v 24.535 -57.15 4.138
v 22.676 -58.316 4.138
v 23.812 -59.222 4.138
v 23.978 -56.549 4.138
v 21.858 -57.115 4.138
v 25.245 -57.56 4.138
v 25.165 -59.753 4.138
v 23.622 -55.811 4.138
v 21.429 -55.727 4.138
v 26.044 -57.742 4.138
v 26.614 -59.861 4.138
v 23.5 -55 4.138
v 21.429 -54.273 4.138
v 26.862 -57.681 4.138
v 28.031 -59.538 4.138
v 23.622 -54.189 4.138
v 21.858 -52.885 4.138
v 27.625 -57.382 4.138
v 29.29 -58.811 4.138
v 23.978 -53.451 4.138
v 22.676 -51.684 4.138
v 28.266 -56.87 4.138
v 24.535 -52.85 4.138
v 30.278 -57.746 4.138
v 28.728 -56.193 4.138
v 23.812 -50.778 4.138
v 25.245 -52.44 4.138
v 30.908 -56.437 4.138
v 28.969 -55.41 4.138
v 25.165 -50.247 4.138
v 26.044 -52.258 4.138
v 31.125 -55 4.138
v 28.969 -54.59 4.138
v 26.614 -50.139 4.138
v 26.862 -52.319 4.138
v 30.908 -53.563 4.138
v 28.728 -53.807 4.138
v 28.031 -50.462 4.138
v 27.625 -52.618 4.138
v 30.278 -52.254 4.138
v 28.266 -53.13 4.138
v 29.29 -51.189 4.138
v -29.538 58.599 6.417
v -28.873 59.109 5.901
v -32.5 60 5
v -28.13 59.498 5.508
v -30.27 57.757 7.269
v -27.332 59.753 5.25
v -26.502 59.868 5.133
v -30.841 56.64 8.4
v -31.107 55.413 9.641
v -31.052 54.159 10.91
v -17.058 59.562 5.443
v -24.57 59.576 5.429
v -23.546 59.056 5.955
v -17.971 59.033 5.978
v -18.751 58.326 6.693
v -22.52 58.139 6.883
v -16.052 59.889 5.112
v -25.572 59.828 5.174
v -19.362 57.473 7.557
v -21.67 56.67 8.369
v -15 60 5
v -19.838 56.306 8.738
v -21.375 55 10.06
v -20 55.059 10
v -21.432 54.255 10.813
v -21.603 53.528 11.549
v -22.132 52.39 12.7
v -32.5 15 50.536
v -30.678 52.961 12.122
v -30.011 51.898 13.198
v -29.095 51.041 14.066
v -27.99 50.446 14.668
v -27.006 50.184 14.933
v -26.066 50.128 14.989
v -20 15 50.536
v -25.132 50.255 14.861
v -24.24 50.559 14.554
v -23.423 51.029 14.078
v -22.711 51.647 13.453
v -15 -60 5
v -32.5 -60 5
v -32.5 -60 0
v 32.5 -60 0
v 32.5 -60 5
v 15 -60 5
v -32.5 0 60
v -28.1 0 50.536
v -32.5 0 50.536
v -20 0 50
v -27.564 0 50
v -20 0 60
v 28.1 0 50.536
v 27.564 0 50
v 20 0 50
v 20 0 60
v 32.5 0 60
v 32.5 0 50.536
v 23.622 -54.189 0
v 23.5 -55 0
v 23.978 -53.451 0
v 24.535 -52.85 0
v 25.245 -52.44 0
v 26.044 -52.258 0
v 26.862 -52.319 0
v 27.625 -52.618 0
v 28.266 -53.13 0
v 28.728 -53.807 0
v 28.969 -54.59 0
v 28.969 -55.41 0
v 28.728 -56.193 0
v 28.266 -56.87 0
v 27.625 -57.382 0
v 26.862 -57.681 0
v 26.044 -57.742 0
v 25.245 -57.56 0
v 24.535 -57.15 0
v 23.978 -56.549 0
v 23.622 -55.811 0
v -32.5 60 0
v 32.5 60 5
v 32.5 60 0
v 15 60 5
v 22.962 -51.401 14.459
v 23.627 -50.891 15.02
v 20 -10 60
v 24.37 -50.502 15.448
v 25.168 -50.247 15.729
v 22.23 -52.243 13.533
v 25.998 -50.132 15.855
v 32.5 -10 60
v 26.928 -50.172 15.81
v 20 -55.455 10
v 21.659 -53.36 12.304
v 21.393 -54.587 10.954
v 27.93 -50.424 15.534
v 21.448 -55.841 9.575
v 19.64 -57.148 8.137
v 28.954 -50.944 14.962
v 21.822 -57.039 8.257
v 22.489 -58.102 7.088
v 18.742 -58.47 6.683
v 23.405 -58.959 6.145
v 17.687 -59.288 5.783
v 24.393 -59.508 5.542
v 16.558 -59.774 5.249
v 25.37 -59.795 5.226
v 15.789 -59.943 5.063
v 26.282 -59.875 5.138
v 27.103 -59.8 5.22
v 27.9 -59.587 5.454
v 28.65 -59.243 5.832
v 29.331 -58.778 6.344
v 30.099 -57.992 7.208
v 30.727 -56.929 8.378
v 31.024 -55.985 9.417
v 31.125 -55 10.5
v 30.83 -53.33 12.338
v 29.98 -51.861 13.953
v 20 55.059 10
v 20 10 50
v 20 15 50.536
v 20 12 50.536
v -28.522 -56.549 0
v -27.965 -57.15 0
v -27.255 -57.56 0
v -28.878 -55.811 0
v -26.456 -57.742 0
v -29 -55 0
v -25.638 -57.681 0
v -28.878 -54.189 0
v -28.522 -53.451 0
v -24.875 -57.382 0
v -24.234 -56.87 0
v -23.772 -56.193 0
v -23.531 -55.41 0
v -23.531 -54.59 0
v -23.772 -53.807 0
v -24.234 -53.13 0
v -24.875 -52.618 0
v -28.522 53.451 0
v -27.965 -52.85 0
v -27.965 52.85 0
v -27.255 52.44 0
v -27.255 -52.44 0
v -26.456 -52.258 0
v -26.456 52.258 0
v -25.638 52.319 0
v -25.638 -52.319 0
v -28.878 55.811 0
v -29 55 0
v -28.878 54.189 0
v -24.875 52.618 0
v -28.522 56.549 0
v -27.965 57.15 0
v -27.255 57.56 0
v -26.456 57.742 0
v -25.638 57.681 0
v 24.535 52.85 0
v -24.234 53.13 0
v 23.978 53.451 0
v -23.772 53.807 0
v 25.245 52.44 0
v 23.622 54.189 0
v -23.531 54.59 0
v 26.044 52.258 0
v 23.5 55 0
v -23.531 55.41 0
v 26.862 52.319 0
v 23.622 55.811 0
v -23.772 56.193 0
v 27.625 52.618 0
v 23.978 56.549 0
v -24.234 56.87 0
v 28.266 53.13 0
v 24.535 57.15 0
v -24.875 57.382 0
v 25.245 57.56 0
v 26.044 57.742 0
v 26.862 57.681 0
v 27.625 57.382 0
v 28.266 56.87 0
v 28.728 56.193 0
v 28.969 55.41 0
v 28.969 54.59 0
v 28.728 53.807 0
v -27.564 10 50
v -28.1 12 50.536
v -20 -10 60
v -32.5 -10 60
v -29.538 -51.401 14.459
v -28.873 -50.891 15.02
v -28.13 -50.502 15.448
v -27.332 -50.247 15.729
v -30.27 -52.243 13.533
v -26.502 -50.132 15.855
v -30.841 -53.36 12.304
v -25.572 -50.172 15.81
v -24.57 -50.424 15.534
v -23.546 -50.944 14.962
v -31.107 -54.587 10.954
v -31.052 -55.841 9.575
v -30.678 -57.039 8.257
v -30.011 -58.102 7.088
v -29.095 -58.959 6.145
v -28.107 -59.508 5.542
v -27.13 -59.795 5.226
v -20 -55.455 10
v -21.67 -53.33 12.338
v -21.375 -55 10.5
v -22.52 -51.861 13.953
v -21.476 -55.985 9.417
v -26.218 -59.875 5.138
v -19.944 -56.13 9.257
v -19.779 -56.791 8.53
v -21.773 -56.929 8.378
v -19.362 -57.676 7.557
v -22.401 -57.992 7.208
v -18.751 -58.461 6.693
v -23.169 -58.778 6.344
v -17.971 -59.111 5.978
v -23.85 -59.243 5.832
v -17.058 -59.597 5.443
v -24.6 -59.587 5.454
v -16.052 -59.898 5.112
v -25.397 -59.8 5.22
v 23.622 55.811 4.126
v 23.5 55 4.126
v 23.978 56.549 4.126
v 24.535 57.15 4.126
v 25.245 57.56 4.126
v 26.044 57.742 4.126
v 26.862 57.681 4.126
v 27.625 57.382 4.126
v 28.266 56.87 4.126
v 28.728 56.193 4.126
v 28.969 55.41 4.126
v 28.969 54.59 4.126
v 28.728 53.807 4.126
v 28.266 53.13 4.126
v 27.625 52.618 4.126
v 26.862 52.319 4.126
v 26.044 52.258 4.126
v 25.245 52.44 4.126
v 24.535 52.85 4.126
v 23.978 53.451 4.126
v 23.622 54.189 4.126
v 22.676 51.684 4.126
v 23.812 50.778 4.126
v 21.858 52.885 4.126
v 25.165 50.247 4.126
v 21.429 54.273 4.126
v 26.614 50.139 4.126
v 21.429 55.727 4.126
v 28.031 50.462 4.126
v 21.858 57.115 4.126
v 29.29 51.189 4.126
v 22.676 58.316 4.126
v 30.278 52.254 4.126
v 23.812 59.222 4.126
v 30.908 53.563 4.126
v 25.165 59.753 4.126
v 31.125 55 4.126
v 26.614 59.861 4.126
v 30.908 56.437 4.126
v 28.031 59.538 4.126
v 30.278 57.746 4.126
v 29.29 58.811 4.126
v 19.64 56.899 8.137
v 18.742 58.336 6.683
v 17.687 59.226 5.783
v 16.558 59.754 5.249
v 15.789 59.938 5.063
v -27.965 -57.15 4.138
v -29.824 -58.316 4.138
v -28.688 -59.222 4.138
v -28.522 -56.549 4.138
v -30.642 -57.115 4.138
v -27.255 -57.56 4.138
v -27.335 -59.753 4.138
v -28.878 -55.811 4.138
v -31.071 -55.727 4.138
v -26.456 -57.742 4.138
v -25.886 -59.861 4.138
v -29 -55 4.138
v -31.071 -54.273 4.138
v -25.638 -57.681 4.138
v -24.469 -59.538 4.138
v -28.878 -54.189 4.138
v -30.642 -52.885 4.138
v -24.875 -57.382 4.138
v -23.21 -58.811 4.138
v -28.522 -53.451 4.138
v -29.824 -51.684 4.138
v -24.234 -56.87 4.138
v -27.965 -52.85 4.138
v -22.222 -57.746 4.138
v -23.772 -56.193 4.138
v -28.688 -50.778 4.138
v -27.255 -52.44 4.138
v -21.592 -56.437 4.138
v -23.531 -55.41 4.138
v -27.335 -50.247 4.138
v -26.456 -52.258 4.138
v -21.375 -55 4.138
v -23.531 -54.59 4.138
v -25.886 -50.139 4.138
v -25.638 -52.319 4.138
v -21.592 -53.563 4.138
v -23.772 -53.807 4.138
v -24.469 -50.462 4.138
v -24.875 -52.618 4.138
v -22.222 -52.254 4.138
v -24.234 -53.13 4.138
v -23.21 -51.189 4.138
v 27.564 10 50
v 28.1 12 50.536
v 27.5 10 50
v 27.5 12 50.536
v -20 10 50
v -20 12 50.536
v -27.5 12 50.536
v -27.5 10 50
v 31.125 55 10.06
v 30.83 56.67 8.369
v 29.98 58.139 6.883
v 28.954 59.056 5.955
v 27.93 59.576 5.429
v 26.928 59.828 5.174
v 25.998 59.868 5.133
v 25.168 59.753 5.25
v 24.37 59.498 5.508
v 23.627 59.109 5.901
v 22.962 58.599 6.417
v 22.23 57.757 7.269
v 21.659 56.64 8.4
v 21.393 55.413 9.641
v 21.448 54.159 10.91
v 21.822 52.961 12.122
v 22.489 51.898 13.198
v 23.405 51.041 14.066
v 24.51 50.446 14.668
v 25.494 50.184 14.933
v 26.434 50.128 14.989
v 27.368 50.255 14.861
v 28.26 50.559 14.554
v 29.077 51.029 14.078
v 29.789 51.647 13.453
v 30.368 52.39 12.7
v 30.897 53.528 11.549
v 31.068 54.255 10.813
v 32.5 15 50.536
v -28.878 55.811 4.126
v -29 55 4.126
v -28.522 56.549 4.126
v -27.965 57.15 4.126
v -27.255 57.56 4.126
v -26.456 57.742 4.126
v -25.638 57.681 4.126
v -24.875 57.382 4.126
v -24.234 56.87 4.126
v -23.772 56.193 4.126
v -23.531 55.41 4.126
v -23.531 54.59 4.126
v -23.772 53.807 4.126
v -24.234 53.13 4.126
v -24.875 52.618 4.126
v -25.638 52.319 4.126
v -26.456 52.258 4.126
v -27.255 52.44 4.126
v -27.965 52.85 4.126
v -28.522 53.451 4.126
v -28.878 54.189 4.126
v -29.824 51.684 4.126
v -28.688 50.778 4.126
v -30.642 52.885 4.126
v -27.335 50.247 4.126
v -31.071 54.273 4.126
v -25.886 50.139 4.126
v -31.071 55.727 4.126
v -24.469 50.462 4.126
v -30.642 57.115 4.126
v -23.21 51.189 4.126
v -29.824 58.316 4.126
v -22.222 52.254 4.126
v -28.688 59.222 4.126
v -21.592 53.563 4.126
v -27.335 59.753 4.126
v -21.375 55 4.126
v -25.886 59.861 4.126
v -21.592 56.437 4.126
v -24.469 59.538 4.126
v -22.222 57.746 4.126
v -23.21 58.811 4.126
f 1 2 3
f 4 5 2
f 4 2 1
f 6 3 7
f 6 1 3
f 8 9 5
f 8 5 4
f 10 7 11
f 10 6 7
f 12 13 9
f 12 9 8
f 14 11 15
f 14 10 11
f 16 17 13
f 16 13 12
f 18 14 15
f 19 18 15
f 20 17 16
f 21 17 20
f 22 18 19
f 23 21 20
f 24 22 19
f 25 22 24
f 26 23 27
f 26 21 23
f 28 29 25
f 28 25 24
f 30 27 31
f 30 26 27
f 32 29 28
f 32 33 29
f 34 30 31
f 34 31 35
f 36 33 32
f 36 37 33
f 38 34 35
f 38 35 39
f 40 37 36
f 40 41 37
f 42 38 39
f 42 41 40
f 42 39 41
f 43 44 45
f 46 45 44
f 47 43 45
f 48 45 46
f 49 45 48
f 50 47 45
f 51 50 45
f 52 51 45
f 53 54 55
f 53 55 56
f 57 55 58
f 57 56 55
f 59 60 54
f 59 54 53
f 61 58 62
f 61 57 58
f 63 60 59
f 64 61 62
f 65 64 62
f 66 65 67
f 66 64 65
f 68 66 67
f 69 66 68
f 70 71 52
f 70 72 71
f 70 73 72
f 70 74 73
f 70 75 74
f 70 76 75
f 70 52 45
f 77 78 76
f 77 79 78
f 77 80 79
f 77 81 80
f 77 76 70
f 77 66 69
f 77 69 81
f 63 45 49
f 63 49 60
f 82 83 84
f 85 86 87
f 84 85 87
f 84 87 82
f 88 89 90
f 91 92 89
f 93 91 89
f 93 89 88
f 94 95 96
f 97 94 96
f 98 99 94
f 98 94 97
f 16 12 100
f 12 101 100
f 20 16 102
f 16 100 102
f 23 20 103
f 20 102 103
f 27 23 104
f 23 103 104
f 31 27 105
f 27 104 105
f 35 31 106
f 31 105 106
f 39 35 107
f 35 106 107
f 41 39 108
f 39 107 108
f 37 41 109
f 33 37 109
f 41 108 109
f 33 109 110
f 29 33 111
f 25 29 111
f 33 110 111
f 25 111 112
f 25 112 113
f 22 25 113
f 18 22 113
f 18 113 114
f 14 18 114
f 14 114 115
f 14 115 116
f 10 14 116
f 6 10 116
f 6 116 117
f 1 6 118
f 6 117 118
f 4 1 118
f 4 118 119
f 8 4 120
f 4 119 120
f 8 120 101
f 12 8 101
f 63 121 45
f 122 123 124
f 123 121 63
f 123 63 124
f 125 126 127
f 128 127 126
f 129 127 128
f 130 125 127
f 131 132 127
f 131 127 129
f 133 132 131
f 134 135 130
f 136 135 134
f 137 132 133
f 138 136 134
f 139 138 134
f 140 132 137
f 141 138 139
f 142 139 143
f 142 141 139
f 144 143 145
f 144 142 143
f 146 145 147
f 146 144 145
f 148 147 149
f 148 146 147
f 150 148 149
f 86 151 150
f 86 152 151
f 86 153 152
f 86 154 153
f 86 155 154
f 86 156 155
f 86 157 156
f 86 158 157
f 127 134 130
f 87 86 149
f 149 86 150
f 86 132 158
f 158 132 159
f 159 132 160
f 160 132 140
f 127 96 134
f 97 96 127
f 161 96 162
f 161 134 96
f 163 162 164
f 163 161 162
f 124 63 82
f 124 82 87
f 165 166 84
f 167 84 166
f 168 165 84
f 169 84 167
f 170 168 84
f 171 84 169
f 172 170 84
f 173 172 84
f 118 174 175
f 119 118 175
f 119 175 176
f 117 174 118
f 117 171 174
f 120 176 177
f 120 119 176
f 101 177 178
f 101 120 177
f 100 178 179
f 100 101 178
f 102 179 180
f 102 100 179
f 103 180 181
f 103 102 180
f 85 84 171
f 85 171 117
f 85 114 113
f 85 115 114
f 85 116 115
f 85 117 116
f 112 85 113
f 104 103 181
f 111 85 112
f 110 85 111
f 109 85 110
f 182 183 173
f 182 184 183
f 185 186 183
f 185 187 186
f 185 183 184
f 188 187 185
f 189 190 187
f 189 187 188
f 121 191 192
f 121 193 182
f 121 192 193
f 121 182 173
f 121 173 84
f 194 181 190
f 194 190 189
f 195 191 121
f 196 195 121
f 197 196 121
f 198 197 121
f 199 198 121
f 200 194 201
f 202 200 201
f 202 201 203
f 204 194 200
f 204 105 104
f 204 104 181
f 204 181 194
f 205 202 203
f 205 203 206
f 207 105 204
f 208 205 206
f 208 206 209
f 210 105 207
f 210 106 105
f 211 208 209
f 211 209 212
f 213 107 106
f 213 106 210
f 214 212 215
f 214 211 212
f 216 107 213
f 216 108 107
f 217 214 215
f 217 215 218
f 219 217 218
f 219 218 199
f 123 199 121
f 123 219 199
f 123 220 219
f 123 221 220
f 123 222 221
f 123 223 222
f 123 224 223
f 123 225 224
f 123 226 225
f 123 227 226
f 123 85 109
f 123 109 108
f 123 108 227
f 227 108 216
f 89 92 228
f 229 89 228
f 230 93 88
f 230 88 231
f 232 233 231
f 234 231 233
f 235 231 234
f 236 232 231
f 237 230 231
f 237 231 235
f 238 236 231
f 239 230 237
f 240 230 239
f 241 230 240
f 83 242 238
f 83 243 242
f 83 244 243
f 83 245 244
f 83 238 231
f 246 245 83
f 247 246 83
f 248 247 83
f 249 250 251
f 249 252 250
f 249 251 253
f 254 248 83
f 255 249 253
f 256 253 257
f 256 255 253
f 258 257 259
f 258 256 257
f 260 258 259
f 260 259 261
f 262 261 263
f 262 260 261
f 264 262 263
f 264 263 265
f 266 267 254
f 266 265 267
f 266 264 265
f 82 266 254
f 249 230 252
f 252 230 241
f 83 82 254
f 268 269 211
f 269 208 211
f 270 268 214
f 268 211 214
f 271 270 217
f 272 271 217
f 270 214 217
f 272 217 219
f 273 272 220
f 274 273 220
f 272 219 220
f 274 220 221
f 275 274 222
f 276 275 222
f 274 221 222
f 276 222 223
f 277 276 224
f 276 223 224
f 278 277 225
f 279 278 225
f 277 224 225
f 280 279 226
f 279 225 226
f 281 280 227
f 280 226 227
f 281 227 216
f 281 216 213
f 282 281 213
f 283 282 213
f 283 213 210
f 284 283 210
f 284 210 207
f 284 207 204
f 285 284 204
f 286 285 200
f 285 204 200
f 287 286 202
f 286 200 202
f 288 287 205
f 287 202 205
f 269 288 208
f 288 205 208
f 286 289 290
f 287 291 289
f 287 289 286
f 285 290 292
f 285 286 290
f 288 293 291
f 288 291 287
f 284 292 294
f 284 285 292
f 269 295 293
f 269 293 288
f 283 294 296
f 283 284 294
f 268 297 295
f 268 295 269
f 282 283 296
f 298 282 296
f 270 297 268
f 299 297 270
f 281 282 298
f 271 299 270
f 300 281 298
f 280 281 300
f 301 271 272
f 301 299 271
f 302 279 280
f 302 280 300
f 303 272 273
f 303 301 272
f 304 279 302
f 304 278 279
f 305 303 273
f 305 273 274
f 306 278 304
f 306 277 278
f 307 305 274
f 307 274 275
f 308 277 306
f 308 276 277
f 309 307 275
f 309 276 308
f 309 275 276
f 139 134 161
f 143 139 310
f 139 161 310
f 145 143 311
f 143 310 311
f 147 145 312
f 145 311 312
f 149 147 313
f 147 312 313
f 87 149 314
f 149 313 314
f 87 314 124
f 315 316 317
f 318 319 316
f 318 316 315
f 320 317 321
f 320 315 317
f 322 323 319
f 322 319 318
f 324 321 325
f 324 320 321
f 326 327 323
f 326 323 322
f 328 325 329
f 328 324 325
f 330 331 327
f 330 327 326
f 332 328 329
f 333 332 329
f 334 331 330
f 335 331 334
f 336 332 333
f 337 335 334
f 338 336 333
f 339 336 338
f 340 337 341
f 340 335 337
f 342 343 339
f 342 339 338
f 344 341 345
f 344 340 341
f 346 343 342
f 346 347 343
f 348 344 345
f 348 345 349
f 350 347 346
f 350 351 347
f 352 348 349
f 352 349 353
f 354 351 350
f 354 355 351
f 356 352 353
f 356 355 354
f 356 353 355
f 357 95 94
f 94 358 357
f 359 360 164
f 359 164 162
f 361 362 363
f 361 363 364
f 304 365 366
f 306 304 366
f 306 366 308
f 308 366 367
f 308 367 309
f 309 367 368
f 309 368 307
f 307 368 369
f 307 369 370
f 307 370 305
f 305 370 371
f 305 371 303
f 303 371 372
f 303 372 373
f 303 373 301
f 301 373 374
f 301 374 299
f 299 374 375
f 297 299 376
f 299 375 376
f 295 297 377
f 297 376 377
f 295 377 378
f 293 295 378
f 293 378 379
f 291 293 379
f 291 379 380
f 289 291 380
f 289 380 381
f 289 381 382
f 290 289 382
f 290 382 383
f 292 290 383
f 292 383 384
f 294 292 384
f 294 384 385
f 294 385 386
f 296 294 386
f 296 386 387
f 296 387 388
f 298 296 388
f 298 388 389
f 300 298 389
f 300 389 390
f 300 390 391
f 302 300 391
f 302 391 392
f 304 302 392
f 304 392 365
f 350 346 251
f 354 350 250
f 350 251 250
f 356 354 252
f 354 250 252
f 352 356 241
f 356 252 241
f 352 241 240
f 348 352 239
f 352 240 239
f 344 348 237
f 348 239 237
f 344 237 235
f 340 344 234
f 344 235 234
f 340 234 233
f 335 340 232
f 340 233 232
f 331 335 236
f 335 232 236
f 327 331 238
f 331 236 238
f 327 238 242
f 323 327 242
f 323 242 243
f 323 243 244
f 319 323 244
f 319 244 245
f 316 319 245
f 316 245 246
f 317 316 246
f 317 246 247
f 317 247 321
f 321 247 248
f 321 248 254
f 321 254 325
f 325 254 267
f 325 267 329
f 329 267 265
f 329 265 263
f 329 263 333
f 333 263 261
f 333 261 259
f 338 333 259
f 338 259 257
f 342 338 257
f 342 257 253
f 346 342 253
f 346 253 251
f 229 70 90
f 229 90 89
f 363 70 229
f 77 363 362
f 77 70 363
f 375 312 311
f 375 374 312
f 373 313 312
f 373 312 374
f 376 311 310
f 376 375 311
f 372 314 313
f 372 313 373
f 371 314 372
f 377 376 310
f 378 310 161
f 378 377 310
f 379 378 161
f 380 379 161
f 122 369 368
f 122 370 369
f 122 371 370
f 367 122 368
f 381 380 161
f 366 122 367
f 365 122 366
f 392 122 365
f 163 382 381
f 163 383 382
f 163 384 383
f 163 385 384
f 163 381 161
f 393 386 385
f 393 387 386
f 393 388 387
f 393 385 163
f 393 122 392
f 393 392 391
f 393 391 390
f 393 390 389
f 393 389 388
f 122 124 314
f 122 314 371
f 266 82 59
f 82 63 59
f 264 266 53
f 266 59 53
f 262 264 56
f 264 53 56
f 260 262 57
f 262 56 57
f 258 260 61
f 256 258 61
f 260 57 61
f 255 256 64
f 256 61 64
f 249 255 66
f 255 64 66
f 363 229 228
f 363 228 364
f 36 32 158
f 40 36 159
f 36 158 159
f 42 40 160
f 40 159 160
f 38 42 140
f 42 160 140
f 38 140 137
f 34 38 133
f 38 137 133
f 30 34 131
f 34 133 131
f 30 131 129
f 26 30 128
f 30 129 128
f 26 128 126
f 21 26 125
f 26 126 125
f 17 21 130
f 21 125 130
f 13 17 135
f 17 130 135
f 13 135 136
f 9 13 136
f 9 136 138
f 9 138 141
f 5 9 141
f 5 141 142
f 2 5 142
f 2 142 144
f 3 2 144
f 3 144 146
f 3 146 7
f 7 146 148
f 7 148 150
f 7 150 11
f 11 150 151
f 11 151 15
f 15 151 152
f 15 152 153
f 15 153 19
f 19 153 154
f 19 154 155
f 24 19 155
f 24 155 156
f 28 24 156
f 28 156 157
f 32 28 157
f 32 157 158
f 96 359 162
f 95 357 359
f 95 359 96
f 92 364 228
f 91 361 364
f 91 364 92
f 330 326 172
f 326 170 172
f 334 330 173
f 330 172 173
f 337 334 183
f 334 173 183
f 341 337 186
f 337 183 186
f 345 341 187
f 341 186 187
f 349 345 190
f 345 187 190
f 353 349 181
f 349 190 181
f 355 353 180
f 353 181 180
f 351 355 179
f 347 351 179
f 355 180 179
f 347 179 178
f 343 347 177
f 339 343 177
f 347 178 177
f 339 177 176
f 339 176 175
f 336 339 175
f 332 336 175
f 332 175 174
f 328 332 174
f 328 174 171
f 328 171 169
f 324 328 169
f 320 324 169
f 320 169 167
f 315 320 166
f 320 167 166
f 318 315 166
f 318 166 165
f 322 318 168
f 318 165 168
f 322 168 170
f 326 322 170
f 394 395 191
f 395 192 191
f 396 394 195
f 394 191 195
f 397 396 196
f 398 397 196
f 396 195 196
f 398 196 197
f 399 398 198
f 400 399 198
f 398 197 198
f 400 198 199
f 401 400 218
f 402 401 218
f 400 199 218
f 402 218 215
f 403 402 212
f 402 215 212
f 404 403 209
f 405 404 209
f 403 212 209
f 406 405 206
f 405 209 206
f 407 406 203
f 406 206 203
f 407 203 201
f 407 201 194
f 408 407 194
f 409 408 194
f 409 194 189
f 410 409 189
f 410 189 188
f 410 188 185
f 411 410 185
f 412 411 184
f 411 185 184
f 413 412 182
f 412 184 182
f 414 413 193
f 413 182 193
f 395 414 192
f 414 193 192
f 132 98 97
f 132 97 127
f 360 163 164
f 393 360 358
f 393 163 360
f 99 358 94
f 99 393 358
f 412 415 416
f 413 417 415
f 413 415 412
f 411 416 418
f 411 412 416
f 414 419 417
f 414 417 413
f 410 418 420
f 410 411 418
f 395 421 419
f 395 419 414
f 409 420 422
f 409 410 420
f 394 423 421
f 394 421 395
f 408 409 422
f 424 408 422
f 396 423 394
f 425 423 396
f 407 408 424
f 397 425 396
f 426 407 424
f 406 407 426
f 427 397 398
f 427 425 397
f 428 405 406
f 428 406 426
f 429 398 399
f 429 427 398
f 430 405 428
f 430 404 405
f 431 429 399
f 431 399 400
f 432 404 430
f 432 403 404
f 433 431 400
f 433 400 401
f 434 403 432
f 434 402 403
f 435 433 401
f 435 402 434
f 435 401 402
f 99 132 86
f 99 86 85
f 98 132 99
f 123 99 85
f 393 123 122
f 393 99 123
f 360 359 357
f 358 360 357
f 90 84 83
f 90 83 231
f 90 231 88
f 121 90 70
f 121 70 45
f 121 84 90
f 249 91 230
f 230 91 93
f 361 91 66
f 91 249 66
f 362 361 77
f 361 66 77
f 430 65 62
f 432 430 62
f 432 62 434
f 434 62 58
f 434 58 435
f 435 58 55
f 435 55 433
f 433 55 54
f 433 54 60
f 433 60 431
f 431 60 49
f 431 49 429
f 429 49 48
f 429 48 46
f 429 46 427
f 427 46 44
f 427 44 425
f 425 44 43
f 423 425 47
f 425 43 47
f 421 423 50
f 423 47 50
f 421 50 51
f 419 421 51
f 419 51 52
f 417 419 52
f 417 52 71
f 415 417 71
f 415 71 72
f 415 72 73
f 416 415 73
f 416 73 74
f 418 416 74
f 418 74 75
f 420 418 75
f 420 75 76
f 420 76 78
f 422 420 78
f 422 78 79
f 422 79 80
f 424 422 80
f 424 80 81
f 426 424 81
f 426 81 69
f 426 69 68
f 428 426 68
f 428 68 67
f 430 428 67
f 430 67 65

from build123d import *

# Parameters (mm, degrees)
F1_DEPTH       = 32.5
F2_W           = 40
F2_H           = 55
F3_DEPTH       = 60.001
F3_DEPTH_BACK  = 60.001
F4_R           = 5
F6_D           = 5.5
F6_START       = 44.8625
F6_START_2     = 44.8735114
F6_CBORE_D     = 9.75
F6_CBORE_DEPTH = 1
F7_W           = 5
F7_H           = 12
F8_DEPTH       = 0.5358983849
F9_T4_DEPTH    = 13.5430097928
F9_T10_DEPTH   = 13.5430097928


# Not quite as in the source:
# - a fillet or chamfer that OpenCascade refuses, or shapes differently, is made with other operations: its cross-section is extruded or revolved along the edge and cut away or added


with BuildPart() as f1:
    # F0 (on Right) → F1 (new body, symmetric)
    with BuildSketch(Plane.YZ):
        Polygon((0, 50), (0, 60), (-10, 60), (-60, 5), (-60, 0), (60, 0), (60, 5), (15, 50.5358983849), (12, 50.5358983849), (10, 50), align=None)
    extrude(amount=F1_DEPTH, both=True)

    # F2 (on Front) → F3 (cut, two sides)
    with BuildSketch(Plane.XZ) as f3_sk:
        with Locations((0, 32.5)):
            Rectangle(F2_W, F2_H)
    extrude(amount=-F3_DEPTH, mode=Mode.SUBTRACT)
    extrude(f3_sk.sketch, amount=F3_DEPTH_BACK, mode=Mode.SUBTRACT)

    # F4
    f4_edges = [f1.edges().sort_by_distance(p)[0] for p in [
        (20, 0, 5),
        (-20, 0, 5),
    ]]
    fillet(f4_edges, radius=F4_R)

    # F6 (through all)
    # its depths count from where the whole tool has entered the part; down to there all is cleared
    with Locations(Plane.XY.offset(50)):
        with Locations((-26.25, 55, -F6_START_2), (26.25, 55, -F6_START_2), (-26.25, -55, -F6_START), (26.25, -55, -F6_START)):
            CounterBoreHole(F6_D / 2, F6_CBORE_D / 2, F6_CBORE_DEPTH)

    # F7 (on face) → F8 (join, through all)
    with BuildSketch(Plane.XY.offset(50)):
        with Locations((-30, 6)):
            Rectangle(F7_W, F7_H)
        with Locations((30, 6)):
            Rectangle(F7_W, F7_H)
    extrude(amount=F8_DEPTH)

    # F9: chamfer of 0.6 on 2 edges, made by hand


with BuildPart() as f9_tool2:
    # F9_s3 → F9_t4 (new body)
    with BuildSketch(Plane.XZ.offset(-13.5430097928)):
        Polygon((27.5, 49.9358983849), (28.1, 50.5358983849), (27.5, 50.5358983849), align=None)
    extrude(amount=F9_T4_DEPTH)

    split(bisect_by=Plane(origin=(0, -11.8301270189, 44.1506350946), x_dir=(1, 0, 0), z_dir=(0, -0.2588190451, 0.9659258263)), keep=Keep.TOP)

    split(bisect_by=Plane.XY.offset(50), keep=Keep.TOP)


with BuildPart() as f1_1:
    add(f1.part)

    # F9_t1: cut F9_tool2
    add(f9_tool2.part, mode=Mode.SUBTRACT)


with BuildPart() as f9_tool8:
    # F9_s9 → F9_t10 (new body)
    with BuildSketch(Plane.XZ):
        Polygon((-27.5, 49.9358983849), (-28.1, 50.5358983849), (-27.5, 50.5358983849), align=None)
    extrude(amount=-F9_T10_DEPTH)

    split(bisect_by=Plane(origin=(0, -11.8301270189, 44.1506350946), x_dir=(1, 0, 0), z_dir=(0, -0.2588190451, 0.9659258263)), keep=Keep.TOP)

    split(bisect_by=Plane.XY.offset(50), keep=Keep.TOP)


with BuildPart() as f1_2:
    add(f1_1.part)

    # F9_t7: cut F9_tool8
    add(f9_tool8.part, mode=Mode.SUBTRACT)


solid = f1_2.part
